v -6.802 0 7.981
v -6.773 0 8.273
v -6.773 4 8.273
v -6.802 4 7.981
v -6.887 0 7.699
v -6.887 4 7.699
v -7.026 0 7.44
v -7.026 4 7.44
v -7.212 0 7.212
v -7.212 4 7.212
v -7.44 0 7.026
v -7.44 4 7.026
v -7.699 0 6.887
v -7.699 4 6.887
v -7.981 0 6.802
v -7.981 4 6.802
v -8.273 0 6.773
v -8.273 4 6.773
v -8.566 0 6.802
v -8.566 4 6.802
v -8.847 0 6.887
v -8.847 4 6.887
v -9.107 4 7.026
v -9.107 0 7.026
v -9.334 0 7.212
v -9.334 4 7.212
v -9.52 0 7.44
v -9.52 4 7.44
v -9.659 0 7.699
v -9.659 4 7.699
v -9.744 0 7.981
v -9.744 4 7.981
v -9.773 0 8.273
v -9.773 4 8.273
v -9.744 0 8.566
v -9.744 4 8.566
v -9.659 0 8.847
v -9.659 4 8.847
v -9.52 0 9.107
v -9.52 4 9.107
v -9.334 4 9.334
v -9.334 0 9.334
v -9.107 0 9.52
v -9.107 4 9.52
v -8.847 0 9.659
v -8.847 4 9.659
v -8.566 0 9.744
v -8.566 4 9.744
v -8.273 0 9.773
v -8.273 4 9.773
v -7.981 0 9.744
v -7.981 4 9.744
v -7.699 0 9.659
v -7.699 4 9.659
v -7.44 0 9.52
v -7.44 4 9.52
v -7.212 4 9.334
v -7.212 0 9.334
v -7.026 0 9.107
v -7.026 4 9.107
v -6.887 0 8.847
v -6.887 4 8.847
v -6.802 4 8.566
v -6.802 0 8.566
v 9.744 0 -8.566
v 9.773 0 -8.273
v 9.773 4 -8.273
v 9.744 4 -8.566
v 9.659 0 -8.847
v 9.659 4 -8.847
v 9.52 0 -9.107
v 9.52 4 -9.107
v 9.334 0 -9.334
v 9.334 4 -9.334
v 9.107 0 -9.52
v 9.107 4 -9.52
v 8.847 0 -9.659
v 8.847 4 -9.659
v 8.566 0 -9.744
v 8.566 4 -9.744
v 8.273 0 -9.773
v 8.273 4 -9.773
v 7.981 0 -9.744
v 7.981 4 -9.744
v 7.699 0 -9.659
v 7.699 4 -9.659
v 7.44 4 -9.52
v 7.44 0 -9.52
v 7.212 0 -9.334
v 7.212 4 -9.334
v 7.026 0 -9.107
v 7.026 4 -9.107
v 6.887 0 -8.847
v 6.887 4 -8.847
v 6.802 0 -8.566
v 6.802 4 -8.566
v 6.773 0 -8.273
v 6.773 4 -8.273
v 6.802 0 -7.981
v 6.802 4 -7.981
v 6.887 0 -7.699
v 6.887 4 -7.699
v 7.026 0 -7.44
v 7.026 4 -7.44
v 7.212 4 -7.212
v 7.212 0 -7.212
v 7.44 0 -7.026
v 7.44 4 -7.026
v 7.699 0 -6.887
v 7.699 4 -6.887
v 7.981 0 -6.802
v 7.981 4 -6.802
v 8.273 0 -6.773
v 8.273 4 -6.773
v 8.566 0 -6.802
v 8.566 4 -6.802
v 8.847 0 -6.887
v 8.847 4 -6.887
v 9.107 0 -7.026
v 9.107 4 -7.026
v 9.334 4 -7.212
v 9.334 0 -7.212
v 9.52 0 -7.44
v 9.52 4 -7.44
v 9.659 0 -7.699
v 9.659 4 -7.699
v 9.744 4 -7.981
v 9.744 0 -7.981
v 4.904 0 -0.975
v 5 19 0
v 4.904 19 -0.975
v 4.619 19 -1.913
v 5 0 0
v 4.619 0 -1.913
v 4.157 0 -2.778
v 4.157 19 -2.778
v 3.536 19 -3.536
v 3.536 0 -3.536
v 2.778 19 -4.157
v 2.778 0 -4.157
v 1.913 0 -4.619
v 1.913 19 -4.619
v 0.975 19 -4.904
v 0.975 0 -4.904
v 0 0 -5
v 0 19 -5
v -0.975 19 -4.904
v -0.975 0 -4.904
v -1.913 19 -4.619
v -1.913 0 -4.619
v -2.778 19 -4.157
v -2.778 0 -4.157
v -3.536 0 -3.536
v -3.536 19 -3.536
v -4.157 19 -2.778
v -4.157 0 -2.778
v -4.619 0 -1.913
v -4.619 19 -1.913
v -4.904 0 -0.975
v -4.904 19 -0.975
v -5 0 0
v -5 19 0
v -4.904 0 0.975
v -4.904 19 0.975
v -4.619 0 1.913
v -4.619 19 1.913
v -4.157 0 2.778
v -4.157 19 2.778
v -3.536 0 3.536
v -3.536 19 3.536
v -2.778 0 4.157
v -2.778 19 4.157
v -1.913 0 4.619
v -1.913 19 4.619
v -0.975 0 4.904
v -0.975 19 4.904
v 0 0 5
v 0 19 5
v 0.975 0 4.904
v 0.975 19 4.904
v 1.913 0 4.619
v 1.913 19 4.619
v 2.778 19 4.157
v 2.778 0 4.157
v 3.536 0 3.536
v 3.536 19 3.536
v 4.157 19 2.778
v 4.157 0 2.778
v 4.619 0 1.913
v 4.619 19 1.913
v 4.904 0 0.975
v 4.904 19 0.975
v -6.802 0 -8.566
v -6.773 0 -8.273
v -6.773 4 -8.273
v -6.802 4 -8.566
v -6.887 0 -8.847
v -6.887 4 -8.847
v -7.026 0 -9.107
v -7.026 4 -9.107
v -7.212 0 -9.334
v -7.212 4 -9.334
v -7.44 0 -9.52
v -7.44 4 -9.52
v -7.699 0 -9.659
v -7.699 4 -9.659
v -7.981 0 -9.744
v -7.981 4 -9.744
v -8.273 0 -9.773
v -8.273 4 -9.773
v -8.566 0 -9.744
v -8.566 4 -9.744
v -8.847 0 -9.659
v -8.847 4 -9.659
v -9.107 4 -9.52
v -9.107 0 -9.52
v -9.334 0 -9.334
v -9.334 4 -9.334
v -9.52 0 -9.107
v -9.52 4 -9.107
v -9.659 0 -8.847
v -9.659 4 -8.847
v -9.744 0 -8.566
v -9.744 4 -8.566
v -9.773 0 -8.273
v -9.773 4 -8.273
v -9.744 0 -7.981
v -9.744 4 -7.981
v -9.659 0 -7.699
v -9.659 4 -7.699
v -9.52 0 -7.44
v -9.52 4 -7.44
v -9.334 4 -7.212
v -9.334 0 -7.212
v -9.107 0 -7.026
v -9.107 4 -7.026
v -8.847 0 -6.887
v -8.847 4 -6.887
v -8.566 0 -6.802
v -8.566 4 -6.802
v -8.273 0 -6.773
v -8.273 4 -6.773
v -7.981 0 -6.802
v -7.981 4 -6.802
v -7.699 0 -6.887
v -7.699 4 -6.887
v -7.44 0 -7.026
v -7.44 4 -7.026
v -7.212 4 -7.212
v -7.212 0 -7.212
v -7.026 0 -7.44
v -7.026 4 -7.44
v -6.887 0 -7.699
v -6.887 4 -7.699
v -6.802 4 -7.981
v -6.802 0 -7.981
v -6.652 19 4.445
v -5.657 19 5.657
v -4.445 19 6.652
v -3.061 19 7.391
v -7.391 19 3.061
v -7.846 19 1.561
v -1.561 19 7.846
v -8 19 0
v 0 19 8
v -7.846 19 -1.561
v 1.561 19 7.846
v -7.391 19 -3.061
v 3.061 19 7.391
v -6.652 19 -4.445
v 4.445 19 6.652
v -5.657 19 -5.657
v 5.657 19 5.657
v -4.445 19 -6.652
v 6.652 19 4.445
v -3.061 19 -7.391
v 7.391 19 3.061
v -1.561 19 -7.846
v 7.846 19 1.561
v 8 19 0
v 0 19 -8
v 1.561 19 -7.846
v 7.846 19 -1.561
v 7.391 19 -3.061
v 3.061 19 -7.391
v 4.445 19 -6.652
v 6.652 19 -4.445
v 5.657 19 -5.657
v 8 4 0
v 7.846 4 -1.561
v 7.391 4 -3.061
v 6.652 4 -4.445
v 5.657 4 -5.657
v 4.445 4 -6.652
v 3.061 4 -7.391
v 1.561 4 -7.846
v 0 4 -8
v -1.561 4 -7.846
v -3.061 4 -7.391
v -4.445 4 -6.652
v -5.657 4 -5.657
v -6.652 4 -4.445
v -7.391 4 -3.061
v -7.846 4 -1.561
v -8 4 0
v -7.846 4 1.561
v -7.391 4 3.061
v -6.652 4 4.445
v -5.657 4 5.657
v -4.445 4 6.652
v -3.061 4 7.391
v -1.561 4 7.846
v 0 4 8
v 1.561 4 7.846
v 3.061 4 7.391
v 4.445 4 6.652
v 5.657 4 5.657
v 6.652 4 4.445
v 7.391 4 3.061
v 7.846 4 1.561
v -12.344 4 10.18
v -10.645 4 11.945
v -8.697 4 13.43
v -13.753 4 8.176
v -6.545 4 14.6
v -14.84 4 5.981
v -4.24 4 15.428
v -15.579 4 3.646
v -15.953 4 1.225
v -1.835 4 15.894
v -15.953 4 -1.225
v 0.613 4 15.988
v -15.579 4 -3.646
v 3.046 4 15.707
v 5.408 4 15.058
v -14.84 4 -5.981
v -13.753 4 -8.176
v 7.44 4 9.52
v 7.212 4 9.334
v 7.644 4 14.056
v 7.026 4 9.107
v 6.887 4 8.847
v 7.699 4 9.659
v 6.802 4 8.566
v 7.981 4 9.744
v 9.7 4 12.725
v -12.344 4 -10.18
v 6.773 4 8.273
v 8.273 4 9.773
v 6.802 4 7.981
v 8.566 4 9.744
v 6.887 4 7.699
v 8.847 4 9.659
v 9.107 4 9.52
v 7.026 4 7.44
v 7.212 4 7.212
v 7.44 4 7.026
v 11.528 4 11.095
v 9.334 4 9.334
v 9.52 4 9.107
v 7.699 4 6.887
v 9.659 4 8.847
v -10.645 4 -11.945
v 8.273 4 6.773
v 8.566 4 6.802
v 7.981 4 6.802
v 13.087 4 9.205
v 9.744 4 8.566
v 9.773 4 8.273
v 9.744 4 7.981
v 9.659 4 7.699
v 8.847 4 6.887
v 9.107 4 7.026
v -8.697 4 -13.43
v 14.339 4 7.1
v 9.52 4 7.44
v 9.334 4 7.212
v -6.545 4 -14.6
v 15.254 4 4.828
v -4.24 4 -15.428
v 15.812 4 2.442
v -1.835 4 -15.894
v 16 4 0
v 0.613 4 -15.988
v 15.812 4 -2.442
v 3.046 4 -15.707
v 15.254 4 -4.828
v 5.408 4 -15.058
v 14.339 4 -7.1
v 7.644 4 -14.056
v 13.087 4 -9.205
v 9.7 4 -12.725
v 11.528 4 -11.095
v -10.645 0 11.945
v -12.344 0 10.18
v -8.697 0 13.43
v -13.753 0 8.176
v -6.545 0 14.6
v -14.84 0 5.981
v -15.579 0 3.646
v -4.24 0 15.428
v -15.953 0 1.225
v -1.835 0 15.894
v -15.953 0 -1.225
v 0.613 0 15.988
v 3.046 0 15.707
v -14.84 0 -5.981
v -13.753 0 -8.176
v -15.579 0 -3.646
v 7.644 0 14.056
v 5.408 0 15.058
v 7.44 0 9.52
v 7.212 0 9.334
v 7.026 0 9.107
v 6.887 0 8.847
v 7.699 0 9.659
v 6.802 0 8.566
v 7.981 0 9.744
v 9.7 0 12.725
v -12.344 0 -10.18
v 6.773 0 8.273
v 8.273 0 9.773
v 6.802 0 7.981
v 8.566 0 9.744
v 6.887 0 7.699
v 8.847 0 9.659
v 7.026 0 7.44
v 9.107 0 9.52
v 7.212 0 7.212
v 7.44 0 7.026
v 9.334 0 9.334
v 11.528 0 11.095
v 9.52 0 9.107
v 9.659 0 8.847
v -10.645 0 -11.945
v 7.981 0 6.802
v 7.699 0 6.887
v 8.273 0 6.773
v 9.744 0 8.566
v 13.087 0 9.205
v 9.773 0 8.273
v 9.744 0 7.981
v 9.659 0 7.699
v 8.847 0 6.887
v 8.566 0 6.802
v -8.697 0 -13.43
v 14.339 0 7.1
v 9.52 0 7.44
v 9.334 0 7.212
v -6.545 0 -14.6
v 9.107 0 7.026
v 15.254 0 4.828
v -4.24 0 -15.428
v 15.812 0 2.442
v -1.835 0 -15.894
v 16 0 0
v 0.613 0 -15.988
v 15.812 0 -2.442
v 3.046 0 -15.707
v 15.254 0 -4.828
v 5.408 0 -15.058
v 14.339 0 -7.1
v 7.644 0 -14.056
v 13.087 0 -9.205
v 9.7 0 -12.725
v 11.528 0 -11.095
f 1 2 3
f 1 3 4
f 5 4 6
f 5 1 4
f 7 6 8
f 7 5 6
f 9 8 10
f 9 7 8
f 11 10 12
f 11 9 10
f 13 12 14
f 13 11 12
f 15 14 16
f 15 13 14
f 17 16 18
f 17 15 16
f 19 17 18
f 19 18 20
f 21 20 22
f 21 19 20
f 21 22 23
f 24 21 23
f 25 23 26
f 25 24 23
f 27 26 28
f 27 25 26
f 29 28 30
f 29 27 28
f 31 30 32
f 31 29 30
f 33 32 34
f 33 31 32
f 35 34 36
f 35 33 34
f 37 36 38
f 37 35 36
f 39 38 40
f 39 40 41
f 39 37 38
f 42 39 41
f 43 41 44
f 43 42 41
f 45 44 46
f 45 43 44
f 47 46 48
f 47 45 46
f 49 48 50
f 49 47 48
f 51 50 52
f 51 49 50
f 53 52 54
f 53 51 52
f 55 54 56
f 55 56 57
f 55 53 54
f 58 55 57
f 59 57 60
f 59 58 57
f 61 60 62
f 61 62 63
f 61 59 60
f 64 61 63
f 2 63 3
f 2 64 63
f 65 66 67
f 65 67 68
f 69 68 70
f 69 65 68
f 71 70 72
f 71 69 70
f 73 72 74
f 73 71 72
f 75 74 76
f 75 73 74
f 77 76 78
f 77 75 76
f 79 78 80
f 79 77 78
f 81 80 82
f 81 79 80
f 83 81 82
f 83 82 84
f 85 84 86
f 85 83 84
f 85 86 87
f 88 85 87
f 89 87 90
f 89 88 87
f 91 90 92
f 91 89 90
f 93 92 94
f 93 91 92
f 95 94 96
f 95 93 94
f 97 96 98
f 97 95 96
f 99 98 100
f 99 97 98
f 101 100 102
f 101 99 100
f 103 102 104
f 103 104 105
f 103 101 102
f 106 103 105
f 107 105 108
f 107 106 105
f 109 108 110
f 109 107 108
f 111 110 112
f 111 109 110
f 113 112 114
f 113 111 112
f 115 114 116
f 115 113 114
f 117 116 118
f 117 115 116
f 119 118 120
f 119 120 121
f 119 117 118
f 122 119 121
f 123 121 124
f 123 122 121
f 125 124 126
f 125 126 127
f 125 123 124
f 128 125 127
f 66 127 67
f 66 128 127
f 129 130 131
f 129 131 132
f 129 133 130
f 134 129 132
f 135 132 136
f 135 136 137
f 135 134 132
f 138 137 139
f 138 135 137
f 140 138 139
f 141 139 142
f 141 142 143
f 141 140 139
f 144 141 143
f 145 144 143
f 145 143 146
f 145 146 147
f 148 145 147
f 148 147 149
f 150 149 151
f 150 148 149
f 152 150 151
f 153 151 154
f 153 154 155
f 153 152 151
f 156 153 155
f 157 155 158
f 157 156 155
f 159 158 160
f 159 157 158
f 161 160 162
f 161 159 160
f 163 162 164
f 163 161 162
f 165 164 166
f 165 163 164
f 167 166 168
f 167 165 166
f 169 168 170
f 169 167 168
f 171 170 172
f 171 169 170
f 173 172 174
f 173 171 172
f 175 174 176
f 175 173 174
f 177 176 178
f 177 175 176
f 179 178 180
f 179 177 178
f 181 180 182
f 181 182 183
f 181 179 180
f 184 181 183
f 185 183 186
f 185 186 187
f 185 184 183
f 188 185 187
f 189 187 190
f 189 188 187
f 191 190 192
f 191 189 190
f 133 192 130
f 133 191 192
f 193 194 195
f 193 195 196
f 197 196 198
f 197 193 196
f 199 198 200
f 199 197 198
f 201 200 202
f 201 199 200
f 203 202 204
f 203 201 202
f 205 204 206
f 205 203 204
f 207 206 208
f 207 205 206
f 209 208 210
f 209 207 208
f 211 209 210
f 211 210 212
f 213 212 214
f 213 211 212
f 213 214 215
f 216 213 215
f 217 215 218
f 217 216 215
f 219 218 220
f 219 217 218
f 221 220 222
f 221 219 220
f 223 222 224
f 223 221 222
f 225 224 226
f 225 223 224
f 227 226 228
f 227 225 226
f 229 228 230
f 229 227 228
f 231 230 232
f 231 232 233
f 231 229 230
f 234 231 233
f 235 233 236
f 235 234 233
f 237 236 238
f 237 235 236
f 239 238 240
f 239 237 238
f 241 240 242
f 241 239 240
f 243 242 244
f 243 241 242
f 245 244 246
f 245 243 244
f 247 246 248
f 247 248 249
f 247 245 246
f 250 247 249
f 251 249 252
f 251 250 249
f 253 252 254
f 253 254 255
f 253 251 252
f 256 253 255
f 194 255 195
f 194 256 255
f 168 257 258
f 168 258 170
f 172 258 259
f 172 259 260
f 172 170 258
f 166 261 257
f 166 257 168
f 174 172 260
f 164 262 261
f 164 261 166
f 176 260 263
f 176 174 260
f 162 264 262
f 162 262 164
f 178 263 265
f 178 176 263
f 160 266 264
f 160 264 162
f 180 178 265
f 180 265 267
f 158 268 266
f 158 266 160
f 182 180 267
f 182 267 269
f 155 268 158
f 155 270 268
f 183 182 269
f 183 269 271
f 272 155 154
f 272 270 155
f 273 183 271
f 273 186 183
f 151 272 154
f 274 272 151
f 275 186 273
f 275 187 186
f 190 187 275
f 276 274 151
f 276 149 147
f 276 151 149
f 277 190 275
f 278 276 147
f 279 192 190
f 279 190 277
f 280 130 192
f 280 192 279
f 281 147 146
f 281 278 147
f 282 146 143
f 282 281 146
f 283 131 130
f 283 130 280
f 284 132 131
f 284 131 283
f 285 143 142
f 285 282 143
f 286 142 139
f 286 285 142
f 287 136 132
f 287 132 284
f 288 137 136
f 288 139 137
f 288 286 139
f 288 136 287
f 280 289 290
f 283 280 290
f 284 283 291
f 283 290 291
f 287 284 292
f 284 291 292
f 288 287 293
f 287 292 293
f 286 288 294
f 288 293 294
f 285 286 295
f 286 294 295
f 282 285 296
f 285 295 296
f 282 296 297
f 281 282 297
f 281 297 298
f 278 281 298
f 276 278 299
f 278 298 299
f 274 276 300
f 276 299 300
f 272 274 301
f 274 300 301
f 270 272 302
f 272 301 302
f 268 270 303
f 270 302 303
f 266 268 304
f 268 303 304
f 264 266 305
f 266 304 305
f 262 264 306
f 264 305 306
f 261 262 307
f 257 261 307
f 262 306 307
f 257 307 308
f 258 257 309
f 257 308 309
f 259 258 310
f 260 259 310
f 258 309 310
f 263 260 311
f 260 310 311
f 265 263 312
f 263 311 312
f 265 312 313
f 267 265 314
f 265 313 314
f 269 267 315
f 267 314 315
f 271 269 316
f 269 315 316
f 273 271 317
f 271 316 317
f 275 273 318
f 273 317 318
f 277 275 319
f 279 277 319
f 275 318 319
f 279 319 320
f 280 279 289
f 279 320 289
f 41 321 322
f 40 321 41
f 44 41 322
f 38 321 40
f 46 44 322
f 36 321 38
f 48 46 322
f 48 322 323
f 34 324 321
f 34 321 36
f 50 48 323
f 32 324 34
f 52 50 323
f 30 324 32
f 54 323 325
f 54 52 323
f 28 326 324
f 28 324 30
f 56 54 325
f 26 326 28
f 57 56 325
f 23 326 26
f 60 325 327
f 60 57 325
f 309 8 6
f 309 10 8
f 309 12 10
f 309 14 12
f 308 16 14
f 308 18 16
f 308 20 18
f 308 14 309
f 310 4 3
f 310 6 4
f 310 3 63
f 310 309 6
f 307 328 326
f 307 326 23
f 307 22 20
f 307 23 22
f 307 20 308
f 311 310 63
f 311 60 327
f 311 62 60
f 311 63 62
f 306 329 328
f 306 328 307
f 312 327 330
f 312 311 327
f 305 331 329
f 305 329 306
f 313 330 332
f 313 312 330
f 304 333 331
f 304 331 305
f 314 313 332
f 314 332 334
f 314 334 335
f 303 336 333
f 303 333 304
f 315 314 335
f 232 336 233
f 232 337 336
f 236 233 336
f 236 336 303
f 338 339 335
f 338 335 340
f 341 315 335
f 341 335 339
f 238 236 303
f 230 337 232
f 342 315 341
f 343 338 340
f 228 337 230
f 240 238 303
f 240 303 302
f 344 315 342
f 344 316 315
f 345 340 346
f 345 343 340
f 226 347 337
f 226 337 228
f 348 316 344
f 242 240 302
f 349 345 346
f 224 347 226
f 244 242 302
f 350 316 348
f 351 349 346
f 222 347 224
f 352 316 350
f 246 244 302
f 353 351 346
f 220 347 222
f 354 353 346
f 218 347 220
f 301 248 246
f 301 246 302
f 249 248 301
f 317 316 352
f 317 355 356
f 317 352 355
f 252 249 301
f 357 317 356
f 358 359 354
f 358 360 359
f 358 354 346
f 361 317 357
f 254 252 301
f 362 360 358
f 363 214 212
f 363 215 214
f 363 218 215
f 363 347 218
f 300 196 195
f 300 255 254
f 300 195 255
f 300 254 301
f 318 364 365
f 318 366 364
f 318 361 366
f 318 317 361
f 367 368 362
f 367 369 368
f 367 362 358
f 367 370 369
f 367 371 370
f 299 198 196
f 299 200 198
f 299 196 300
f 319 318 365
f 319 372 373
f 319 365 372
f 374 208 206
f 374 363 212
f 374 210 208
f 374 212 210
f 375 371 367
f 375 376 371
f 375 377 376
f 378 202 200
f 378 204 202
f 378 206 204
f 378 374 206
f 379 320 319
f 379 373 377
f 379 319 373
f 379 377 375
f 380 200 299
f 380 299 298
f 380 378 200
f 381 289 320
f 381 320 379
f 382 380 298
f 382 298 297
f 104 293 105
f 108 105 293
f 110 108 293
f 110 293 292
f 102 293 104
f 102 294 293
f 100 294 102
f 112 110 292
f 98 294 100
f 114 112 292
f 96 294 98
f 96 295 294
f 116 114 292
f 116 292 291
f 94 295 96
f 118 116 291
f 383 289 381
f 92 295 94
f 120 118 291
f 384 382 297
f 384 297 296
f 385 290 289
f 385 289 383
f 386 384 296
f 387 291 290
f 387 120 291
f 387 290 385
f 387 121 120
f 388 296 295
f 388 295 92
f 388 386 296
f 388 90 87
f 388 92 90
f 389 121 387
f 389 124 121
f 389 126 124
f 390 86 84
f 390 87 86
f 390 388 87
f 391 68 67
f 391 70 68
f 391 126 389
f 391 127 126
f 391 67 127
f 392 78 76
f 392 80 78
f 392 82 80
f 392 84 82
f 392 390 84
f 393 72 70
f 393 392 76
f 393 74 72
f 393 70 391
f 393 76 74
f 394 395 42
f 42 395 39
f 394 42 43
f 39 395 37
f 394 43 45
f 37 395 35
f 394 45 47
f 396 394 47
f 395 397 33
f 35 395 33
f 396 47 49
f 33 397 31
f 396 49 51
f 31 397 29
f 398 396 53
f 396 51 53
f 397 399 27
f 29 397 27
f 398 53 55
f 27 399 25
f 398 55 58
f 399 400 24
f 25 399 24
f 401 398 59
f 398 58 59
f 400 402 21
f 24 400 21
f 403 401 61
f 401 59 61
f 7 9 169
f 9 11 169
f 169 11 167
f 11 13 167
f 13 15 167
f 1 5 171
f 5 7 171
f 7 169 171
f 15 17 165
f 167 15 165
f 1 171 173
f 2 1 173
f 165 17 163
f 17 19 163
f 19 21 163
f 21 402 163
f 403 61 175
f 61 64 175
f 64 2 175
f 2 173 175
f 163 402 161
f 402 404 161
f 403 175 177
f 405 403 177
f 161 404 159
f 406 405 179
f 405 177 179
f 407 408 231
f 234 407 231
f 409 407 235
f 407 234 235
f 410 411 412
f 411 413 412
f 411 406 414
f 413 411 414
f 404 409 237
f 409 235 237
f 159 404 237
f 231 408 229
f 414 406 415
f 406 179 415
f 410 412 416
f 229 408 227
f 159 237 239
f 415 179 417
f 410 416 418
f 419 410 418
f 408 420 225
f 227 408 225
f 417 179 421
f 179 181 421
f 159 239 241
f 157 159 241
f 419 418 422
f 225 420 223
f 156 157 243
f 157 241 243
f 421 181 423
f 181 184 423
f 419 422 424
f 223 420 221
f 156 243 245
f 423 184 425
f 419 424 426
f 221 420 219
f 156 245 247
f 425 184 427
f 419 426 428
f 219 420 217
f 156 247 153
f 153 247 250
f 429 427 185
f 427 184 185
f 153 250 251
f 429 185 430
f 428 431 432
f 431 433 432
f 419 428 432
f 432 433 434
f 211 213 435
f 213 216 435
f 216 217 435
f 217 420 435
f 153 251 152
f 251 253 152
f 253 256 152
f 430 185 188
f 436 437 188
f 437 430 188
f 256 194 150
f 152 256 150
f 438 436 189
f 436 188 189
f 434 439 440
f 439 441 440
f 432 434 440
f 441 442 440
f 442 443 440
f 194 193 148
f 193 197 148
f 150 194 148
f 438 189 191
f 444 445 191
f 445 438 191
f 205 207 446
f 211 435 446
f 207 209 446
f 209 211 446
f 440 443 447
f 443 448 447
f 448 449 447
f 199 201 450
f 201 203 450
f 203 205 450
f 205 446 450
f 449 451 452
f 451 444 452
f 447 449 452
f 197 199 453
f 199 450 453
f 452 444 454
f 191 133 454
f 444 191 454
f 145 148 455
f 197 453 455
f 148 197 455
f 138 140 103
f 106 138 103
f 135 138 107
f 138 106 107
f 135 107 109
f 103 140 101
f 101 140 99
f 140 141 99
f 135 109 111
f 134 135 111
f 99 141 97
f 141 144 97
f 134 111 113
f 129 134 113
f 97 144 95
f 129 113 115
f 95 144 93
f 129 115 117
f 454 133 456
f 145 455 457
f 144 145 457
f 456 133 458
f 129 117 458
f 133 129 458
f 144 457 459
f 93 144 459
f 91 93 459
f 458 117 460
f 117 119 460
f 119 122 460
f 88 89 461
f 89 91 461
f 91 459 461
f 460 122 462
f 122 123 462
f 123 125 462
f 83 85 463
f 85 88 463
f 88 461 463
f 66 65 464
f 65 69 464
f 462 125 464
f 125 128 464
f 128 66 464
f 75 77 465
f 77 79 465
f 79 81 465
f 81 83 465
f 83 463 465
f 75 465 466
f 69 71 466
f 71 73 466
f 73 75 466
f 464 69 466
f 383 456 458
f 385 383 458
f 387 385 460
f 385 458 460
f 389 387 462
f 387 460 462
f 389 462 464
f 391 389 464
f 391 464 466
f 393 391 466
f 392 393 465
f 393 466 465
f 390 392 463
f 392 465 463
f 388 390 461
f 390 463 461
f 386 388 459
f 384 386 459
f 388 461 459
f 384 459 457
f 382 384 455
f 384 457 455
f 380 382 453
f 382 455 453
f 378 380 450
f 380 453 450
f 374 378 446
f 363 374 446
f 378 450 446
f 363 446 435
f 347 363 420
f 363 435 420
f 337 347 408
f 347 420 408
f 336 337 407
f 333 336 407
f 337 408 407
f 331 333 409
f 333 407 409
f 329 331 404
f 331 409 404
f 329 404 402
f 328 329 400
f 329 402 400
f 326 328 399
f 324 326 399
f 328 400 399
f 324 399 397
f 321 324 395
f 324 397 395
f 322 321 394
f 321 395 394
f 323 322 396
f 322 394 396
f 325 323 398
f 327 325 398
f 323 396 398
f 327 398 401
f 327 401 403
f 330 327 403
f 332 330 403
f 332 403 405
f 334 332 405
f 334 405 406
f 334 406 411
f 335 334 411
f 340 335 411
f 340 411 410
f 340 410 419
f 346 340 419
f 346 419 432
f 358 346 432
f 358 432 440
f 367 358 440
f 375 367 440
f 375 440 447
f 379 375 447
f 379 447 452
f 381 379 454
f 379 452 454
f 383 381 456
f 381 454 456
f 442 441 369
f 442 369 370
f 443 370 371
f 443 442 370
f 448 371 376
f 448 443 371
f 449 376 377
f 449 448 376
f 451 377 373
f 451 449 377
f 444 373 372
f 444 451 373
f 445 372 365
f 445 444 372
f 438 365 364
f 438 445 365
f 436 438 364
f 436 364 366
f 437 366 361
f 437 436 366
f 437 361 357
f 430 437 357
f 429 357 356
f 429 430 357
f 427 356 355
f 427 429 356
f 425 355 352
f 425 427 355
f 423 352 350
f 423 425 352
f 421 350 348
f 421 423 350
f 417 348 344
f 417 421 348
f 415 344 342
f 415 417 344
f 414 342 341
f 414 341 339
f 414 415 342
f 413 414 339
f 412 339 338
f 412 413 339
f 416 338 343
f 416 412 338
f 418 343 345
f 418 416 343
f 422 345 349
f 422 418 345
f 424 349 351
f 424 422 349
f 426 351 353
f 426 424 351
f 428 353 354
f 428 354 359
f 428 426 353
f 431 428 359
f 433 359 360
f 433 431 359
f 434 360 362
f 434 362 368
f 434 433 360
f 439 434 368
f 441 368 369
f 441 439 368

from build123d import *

# Parameters (mm, degrees)
SKETCH1_R           = 16
SKETCH1_R_2         = 1.5
SKETCH1_R_3         = 5
BOSS_EXTRUDE1_DEPTH = 4
SKETCH2_R           = 8
SKETCH2_R_2         = 5
BOSS_EXTRUDE2_DEPTH = 15


with BuildPart() as part:
    # Sketch1 → Boss-Extrude1 (new body)
    with BuildSketch(Plane(origin=(0, 0, 0), x_dir=(1, 0, 0), z_dir=(0, 1, 0))):
        Circle(SKETCH1_R)
        with Locations((8.27314934, -8.27314934)):
            Circle(SKETCH1_R_2, mode=Mode.SUBTRACT)
        Circle(SKETCH1_R_3, mode=Mode.SUBTRACT)
        with Locations((-8.27314934, -8.27314934)):
            Circle(SKETCH1_R_2, mode=Mode.SUBTRACT)
        with Locations((8.27314934, 8.27314934)):
            Circle(SKETCH1_R_2, mode=Mode.SUBTRACT)
        with Locations((-8.27314934, 8.27314934)):
            Circle(SKETCH1_R_2, mode=Mode.SUBTRACT)
    extrude(amount=BOSS_EXTRUDE1_DEPTH)

    # Sketch2 → Boss-Extrude2 (add)
    with BuildSketch(Plane(origin=(0, 4, 0), x_dir=(1, 0, 0), z_dir=(0, 1, 0))):
        Circle(SKETCH2_R)
        Circle(SKETCH2_R_2, mode=Mode.SUBTRACT)
    extrude(amount=BOSS_EXTRUDE2_DEPTH)


solid = part.part
